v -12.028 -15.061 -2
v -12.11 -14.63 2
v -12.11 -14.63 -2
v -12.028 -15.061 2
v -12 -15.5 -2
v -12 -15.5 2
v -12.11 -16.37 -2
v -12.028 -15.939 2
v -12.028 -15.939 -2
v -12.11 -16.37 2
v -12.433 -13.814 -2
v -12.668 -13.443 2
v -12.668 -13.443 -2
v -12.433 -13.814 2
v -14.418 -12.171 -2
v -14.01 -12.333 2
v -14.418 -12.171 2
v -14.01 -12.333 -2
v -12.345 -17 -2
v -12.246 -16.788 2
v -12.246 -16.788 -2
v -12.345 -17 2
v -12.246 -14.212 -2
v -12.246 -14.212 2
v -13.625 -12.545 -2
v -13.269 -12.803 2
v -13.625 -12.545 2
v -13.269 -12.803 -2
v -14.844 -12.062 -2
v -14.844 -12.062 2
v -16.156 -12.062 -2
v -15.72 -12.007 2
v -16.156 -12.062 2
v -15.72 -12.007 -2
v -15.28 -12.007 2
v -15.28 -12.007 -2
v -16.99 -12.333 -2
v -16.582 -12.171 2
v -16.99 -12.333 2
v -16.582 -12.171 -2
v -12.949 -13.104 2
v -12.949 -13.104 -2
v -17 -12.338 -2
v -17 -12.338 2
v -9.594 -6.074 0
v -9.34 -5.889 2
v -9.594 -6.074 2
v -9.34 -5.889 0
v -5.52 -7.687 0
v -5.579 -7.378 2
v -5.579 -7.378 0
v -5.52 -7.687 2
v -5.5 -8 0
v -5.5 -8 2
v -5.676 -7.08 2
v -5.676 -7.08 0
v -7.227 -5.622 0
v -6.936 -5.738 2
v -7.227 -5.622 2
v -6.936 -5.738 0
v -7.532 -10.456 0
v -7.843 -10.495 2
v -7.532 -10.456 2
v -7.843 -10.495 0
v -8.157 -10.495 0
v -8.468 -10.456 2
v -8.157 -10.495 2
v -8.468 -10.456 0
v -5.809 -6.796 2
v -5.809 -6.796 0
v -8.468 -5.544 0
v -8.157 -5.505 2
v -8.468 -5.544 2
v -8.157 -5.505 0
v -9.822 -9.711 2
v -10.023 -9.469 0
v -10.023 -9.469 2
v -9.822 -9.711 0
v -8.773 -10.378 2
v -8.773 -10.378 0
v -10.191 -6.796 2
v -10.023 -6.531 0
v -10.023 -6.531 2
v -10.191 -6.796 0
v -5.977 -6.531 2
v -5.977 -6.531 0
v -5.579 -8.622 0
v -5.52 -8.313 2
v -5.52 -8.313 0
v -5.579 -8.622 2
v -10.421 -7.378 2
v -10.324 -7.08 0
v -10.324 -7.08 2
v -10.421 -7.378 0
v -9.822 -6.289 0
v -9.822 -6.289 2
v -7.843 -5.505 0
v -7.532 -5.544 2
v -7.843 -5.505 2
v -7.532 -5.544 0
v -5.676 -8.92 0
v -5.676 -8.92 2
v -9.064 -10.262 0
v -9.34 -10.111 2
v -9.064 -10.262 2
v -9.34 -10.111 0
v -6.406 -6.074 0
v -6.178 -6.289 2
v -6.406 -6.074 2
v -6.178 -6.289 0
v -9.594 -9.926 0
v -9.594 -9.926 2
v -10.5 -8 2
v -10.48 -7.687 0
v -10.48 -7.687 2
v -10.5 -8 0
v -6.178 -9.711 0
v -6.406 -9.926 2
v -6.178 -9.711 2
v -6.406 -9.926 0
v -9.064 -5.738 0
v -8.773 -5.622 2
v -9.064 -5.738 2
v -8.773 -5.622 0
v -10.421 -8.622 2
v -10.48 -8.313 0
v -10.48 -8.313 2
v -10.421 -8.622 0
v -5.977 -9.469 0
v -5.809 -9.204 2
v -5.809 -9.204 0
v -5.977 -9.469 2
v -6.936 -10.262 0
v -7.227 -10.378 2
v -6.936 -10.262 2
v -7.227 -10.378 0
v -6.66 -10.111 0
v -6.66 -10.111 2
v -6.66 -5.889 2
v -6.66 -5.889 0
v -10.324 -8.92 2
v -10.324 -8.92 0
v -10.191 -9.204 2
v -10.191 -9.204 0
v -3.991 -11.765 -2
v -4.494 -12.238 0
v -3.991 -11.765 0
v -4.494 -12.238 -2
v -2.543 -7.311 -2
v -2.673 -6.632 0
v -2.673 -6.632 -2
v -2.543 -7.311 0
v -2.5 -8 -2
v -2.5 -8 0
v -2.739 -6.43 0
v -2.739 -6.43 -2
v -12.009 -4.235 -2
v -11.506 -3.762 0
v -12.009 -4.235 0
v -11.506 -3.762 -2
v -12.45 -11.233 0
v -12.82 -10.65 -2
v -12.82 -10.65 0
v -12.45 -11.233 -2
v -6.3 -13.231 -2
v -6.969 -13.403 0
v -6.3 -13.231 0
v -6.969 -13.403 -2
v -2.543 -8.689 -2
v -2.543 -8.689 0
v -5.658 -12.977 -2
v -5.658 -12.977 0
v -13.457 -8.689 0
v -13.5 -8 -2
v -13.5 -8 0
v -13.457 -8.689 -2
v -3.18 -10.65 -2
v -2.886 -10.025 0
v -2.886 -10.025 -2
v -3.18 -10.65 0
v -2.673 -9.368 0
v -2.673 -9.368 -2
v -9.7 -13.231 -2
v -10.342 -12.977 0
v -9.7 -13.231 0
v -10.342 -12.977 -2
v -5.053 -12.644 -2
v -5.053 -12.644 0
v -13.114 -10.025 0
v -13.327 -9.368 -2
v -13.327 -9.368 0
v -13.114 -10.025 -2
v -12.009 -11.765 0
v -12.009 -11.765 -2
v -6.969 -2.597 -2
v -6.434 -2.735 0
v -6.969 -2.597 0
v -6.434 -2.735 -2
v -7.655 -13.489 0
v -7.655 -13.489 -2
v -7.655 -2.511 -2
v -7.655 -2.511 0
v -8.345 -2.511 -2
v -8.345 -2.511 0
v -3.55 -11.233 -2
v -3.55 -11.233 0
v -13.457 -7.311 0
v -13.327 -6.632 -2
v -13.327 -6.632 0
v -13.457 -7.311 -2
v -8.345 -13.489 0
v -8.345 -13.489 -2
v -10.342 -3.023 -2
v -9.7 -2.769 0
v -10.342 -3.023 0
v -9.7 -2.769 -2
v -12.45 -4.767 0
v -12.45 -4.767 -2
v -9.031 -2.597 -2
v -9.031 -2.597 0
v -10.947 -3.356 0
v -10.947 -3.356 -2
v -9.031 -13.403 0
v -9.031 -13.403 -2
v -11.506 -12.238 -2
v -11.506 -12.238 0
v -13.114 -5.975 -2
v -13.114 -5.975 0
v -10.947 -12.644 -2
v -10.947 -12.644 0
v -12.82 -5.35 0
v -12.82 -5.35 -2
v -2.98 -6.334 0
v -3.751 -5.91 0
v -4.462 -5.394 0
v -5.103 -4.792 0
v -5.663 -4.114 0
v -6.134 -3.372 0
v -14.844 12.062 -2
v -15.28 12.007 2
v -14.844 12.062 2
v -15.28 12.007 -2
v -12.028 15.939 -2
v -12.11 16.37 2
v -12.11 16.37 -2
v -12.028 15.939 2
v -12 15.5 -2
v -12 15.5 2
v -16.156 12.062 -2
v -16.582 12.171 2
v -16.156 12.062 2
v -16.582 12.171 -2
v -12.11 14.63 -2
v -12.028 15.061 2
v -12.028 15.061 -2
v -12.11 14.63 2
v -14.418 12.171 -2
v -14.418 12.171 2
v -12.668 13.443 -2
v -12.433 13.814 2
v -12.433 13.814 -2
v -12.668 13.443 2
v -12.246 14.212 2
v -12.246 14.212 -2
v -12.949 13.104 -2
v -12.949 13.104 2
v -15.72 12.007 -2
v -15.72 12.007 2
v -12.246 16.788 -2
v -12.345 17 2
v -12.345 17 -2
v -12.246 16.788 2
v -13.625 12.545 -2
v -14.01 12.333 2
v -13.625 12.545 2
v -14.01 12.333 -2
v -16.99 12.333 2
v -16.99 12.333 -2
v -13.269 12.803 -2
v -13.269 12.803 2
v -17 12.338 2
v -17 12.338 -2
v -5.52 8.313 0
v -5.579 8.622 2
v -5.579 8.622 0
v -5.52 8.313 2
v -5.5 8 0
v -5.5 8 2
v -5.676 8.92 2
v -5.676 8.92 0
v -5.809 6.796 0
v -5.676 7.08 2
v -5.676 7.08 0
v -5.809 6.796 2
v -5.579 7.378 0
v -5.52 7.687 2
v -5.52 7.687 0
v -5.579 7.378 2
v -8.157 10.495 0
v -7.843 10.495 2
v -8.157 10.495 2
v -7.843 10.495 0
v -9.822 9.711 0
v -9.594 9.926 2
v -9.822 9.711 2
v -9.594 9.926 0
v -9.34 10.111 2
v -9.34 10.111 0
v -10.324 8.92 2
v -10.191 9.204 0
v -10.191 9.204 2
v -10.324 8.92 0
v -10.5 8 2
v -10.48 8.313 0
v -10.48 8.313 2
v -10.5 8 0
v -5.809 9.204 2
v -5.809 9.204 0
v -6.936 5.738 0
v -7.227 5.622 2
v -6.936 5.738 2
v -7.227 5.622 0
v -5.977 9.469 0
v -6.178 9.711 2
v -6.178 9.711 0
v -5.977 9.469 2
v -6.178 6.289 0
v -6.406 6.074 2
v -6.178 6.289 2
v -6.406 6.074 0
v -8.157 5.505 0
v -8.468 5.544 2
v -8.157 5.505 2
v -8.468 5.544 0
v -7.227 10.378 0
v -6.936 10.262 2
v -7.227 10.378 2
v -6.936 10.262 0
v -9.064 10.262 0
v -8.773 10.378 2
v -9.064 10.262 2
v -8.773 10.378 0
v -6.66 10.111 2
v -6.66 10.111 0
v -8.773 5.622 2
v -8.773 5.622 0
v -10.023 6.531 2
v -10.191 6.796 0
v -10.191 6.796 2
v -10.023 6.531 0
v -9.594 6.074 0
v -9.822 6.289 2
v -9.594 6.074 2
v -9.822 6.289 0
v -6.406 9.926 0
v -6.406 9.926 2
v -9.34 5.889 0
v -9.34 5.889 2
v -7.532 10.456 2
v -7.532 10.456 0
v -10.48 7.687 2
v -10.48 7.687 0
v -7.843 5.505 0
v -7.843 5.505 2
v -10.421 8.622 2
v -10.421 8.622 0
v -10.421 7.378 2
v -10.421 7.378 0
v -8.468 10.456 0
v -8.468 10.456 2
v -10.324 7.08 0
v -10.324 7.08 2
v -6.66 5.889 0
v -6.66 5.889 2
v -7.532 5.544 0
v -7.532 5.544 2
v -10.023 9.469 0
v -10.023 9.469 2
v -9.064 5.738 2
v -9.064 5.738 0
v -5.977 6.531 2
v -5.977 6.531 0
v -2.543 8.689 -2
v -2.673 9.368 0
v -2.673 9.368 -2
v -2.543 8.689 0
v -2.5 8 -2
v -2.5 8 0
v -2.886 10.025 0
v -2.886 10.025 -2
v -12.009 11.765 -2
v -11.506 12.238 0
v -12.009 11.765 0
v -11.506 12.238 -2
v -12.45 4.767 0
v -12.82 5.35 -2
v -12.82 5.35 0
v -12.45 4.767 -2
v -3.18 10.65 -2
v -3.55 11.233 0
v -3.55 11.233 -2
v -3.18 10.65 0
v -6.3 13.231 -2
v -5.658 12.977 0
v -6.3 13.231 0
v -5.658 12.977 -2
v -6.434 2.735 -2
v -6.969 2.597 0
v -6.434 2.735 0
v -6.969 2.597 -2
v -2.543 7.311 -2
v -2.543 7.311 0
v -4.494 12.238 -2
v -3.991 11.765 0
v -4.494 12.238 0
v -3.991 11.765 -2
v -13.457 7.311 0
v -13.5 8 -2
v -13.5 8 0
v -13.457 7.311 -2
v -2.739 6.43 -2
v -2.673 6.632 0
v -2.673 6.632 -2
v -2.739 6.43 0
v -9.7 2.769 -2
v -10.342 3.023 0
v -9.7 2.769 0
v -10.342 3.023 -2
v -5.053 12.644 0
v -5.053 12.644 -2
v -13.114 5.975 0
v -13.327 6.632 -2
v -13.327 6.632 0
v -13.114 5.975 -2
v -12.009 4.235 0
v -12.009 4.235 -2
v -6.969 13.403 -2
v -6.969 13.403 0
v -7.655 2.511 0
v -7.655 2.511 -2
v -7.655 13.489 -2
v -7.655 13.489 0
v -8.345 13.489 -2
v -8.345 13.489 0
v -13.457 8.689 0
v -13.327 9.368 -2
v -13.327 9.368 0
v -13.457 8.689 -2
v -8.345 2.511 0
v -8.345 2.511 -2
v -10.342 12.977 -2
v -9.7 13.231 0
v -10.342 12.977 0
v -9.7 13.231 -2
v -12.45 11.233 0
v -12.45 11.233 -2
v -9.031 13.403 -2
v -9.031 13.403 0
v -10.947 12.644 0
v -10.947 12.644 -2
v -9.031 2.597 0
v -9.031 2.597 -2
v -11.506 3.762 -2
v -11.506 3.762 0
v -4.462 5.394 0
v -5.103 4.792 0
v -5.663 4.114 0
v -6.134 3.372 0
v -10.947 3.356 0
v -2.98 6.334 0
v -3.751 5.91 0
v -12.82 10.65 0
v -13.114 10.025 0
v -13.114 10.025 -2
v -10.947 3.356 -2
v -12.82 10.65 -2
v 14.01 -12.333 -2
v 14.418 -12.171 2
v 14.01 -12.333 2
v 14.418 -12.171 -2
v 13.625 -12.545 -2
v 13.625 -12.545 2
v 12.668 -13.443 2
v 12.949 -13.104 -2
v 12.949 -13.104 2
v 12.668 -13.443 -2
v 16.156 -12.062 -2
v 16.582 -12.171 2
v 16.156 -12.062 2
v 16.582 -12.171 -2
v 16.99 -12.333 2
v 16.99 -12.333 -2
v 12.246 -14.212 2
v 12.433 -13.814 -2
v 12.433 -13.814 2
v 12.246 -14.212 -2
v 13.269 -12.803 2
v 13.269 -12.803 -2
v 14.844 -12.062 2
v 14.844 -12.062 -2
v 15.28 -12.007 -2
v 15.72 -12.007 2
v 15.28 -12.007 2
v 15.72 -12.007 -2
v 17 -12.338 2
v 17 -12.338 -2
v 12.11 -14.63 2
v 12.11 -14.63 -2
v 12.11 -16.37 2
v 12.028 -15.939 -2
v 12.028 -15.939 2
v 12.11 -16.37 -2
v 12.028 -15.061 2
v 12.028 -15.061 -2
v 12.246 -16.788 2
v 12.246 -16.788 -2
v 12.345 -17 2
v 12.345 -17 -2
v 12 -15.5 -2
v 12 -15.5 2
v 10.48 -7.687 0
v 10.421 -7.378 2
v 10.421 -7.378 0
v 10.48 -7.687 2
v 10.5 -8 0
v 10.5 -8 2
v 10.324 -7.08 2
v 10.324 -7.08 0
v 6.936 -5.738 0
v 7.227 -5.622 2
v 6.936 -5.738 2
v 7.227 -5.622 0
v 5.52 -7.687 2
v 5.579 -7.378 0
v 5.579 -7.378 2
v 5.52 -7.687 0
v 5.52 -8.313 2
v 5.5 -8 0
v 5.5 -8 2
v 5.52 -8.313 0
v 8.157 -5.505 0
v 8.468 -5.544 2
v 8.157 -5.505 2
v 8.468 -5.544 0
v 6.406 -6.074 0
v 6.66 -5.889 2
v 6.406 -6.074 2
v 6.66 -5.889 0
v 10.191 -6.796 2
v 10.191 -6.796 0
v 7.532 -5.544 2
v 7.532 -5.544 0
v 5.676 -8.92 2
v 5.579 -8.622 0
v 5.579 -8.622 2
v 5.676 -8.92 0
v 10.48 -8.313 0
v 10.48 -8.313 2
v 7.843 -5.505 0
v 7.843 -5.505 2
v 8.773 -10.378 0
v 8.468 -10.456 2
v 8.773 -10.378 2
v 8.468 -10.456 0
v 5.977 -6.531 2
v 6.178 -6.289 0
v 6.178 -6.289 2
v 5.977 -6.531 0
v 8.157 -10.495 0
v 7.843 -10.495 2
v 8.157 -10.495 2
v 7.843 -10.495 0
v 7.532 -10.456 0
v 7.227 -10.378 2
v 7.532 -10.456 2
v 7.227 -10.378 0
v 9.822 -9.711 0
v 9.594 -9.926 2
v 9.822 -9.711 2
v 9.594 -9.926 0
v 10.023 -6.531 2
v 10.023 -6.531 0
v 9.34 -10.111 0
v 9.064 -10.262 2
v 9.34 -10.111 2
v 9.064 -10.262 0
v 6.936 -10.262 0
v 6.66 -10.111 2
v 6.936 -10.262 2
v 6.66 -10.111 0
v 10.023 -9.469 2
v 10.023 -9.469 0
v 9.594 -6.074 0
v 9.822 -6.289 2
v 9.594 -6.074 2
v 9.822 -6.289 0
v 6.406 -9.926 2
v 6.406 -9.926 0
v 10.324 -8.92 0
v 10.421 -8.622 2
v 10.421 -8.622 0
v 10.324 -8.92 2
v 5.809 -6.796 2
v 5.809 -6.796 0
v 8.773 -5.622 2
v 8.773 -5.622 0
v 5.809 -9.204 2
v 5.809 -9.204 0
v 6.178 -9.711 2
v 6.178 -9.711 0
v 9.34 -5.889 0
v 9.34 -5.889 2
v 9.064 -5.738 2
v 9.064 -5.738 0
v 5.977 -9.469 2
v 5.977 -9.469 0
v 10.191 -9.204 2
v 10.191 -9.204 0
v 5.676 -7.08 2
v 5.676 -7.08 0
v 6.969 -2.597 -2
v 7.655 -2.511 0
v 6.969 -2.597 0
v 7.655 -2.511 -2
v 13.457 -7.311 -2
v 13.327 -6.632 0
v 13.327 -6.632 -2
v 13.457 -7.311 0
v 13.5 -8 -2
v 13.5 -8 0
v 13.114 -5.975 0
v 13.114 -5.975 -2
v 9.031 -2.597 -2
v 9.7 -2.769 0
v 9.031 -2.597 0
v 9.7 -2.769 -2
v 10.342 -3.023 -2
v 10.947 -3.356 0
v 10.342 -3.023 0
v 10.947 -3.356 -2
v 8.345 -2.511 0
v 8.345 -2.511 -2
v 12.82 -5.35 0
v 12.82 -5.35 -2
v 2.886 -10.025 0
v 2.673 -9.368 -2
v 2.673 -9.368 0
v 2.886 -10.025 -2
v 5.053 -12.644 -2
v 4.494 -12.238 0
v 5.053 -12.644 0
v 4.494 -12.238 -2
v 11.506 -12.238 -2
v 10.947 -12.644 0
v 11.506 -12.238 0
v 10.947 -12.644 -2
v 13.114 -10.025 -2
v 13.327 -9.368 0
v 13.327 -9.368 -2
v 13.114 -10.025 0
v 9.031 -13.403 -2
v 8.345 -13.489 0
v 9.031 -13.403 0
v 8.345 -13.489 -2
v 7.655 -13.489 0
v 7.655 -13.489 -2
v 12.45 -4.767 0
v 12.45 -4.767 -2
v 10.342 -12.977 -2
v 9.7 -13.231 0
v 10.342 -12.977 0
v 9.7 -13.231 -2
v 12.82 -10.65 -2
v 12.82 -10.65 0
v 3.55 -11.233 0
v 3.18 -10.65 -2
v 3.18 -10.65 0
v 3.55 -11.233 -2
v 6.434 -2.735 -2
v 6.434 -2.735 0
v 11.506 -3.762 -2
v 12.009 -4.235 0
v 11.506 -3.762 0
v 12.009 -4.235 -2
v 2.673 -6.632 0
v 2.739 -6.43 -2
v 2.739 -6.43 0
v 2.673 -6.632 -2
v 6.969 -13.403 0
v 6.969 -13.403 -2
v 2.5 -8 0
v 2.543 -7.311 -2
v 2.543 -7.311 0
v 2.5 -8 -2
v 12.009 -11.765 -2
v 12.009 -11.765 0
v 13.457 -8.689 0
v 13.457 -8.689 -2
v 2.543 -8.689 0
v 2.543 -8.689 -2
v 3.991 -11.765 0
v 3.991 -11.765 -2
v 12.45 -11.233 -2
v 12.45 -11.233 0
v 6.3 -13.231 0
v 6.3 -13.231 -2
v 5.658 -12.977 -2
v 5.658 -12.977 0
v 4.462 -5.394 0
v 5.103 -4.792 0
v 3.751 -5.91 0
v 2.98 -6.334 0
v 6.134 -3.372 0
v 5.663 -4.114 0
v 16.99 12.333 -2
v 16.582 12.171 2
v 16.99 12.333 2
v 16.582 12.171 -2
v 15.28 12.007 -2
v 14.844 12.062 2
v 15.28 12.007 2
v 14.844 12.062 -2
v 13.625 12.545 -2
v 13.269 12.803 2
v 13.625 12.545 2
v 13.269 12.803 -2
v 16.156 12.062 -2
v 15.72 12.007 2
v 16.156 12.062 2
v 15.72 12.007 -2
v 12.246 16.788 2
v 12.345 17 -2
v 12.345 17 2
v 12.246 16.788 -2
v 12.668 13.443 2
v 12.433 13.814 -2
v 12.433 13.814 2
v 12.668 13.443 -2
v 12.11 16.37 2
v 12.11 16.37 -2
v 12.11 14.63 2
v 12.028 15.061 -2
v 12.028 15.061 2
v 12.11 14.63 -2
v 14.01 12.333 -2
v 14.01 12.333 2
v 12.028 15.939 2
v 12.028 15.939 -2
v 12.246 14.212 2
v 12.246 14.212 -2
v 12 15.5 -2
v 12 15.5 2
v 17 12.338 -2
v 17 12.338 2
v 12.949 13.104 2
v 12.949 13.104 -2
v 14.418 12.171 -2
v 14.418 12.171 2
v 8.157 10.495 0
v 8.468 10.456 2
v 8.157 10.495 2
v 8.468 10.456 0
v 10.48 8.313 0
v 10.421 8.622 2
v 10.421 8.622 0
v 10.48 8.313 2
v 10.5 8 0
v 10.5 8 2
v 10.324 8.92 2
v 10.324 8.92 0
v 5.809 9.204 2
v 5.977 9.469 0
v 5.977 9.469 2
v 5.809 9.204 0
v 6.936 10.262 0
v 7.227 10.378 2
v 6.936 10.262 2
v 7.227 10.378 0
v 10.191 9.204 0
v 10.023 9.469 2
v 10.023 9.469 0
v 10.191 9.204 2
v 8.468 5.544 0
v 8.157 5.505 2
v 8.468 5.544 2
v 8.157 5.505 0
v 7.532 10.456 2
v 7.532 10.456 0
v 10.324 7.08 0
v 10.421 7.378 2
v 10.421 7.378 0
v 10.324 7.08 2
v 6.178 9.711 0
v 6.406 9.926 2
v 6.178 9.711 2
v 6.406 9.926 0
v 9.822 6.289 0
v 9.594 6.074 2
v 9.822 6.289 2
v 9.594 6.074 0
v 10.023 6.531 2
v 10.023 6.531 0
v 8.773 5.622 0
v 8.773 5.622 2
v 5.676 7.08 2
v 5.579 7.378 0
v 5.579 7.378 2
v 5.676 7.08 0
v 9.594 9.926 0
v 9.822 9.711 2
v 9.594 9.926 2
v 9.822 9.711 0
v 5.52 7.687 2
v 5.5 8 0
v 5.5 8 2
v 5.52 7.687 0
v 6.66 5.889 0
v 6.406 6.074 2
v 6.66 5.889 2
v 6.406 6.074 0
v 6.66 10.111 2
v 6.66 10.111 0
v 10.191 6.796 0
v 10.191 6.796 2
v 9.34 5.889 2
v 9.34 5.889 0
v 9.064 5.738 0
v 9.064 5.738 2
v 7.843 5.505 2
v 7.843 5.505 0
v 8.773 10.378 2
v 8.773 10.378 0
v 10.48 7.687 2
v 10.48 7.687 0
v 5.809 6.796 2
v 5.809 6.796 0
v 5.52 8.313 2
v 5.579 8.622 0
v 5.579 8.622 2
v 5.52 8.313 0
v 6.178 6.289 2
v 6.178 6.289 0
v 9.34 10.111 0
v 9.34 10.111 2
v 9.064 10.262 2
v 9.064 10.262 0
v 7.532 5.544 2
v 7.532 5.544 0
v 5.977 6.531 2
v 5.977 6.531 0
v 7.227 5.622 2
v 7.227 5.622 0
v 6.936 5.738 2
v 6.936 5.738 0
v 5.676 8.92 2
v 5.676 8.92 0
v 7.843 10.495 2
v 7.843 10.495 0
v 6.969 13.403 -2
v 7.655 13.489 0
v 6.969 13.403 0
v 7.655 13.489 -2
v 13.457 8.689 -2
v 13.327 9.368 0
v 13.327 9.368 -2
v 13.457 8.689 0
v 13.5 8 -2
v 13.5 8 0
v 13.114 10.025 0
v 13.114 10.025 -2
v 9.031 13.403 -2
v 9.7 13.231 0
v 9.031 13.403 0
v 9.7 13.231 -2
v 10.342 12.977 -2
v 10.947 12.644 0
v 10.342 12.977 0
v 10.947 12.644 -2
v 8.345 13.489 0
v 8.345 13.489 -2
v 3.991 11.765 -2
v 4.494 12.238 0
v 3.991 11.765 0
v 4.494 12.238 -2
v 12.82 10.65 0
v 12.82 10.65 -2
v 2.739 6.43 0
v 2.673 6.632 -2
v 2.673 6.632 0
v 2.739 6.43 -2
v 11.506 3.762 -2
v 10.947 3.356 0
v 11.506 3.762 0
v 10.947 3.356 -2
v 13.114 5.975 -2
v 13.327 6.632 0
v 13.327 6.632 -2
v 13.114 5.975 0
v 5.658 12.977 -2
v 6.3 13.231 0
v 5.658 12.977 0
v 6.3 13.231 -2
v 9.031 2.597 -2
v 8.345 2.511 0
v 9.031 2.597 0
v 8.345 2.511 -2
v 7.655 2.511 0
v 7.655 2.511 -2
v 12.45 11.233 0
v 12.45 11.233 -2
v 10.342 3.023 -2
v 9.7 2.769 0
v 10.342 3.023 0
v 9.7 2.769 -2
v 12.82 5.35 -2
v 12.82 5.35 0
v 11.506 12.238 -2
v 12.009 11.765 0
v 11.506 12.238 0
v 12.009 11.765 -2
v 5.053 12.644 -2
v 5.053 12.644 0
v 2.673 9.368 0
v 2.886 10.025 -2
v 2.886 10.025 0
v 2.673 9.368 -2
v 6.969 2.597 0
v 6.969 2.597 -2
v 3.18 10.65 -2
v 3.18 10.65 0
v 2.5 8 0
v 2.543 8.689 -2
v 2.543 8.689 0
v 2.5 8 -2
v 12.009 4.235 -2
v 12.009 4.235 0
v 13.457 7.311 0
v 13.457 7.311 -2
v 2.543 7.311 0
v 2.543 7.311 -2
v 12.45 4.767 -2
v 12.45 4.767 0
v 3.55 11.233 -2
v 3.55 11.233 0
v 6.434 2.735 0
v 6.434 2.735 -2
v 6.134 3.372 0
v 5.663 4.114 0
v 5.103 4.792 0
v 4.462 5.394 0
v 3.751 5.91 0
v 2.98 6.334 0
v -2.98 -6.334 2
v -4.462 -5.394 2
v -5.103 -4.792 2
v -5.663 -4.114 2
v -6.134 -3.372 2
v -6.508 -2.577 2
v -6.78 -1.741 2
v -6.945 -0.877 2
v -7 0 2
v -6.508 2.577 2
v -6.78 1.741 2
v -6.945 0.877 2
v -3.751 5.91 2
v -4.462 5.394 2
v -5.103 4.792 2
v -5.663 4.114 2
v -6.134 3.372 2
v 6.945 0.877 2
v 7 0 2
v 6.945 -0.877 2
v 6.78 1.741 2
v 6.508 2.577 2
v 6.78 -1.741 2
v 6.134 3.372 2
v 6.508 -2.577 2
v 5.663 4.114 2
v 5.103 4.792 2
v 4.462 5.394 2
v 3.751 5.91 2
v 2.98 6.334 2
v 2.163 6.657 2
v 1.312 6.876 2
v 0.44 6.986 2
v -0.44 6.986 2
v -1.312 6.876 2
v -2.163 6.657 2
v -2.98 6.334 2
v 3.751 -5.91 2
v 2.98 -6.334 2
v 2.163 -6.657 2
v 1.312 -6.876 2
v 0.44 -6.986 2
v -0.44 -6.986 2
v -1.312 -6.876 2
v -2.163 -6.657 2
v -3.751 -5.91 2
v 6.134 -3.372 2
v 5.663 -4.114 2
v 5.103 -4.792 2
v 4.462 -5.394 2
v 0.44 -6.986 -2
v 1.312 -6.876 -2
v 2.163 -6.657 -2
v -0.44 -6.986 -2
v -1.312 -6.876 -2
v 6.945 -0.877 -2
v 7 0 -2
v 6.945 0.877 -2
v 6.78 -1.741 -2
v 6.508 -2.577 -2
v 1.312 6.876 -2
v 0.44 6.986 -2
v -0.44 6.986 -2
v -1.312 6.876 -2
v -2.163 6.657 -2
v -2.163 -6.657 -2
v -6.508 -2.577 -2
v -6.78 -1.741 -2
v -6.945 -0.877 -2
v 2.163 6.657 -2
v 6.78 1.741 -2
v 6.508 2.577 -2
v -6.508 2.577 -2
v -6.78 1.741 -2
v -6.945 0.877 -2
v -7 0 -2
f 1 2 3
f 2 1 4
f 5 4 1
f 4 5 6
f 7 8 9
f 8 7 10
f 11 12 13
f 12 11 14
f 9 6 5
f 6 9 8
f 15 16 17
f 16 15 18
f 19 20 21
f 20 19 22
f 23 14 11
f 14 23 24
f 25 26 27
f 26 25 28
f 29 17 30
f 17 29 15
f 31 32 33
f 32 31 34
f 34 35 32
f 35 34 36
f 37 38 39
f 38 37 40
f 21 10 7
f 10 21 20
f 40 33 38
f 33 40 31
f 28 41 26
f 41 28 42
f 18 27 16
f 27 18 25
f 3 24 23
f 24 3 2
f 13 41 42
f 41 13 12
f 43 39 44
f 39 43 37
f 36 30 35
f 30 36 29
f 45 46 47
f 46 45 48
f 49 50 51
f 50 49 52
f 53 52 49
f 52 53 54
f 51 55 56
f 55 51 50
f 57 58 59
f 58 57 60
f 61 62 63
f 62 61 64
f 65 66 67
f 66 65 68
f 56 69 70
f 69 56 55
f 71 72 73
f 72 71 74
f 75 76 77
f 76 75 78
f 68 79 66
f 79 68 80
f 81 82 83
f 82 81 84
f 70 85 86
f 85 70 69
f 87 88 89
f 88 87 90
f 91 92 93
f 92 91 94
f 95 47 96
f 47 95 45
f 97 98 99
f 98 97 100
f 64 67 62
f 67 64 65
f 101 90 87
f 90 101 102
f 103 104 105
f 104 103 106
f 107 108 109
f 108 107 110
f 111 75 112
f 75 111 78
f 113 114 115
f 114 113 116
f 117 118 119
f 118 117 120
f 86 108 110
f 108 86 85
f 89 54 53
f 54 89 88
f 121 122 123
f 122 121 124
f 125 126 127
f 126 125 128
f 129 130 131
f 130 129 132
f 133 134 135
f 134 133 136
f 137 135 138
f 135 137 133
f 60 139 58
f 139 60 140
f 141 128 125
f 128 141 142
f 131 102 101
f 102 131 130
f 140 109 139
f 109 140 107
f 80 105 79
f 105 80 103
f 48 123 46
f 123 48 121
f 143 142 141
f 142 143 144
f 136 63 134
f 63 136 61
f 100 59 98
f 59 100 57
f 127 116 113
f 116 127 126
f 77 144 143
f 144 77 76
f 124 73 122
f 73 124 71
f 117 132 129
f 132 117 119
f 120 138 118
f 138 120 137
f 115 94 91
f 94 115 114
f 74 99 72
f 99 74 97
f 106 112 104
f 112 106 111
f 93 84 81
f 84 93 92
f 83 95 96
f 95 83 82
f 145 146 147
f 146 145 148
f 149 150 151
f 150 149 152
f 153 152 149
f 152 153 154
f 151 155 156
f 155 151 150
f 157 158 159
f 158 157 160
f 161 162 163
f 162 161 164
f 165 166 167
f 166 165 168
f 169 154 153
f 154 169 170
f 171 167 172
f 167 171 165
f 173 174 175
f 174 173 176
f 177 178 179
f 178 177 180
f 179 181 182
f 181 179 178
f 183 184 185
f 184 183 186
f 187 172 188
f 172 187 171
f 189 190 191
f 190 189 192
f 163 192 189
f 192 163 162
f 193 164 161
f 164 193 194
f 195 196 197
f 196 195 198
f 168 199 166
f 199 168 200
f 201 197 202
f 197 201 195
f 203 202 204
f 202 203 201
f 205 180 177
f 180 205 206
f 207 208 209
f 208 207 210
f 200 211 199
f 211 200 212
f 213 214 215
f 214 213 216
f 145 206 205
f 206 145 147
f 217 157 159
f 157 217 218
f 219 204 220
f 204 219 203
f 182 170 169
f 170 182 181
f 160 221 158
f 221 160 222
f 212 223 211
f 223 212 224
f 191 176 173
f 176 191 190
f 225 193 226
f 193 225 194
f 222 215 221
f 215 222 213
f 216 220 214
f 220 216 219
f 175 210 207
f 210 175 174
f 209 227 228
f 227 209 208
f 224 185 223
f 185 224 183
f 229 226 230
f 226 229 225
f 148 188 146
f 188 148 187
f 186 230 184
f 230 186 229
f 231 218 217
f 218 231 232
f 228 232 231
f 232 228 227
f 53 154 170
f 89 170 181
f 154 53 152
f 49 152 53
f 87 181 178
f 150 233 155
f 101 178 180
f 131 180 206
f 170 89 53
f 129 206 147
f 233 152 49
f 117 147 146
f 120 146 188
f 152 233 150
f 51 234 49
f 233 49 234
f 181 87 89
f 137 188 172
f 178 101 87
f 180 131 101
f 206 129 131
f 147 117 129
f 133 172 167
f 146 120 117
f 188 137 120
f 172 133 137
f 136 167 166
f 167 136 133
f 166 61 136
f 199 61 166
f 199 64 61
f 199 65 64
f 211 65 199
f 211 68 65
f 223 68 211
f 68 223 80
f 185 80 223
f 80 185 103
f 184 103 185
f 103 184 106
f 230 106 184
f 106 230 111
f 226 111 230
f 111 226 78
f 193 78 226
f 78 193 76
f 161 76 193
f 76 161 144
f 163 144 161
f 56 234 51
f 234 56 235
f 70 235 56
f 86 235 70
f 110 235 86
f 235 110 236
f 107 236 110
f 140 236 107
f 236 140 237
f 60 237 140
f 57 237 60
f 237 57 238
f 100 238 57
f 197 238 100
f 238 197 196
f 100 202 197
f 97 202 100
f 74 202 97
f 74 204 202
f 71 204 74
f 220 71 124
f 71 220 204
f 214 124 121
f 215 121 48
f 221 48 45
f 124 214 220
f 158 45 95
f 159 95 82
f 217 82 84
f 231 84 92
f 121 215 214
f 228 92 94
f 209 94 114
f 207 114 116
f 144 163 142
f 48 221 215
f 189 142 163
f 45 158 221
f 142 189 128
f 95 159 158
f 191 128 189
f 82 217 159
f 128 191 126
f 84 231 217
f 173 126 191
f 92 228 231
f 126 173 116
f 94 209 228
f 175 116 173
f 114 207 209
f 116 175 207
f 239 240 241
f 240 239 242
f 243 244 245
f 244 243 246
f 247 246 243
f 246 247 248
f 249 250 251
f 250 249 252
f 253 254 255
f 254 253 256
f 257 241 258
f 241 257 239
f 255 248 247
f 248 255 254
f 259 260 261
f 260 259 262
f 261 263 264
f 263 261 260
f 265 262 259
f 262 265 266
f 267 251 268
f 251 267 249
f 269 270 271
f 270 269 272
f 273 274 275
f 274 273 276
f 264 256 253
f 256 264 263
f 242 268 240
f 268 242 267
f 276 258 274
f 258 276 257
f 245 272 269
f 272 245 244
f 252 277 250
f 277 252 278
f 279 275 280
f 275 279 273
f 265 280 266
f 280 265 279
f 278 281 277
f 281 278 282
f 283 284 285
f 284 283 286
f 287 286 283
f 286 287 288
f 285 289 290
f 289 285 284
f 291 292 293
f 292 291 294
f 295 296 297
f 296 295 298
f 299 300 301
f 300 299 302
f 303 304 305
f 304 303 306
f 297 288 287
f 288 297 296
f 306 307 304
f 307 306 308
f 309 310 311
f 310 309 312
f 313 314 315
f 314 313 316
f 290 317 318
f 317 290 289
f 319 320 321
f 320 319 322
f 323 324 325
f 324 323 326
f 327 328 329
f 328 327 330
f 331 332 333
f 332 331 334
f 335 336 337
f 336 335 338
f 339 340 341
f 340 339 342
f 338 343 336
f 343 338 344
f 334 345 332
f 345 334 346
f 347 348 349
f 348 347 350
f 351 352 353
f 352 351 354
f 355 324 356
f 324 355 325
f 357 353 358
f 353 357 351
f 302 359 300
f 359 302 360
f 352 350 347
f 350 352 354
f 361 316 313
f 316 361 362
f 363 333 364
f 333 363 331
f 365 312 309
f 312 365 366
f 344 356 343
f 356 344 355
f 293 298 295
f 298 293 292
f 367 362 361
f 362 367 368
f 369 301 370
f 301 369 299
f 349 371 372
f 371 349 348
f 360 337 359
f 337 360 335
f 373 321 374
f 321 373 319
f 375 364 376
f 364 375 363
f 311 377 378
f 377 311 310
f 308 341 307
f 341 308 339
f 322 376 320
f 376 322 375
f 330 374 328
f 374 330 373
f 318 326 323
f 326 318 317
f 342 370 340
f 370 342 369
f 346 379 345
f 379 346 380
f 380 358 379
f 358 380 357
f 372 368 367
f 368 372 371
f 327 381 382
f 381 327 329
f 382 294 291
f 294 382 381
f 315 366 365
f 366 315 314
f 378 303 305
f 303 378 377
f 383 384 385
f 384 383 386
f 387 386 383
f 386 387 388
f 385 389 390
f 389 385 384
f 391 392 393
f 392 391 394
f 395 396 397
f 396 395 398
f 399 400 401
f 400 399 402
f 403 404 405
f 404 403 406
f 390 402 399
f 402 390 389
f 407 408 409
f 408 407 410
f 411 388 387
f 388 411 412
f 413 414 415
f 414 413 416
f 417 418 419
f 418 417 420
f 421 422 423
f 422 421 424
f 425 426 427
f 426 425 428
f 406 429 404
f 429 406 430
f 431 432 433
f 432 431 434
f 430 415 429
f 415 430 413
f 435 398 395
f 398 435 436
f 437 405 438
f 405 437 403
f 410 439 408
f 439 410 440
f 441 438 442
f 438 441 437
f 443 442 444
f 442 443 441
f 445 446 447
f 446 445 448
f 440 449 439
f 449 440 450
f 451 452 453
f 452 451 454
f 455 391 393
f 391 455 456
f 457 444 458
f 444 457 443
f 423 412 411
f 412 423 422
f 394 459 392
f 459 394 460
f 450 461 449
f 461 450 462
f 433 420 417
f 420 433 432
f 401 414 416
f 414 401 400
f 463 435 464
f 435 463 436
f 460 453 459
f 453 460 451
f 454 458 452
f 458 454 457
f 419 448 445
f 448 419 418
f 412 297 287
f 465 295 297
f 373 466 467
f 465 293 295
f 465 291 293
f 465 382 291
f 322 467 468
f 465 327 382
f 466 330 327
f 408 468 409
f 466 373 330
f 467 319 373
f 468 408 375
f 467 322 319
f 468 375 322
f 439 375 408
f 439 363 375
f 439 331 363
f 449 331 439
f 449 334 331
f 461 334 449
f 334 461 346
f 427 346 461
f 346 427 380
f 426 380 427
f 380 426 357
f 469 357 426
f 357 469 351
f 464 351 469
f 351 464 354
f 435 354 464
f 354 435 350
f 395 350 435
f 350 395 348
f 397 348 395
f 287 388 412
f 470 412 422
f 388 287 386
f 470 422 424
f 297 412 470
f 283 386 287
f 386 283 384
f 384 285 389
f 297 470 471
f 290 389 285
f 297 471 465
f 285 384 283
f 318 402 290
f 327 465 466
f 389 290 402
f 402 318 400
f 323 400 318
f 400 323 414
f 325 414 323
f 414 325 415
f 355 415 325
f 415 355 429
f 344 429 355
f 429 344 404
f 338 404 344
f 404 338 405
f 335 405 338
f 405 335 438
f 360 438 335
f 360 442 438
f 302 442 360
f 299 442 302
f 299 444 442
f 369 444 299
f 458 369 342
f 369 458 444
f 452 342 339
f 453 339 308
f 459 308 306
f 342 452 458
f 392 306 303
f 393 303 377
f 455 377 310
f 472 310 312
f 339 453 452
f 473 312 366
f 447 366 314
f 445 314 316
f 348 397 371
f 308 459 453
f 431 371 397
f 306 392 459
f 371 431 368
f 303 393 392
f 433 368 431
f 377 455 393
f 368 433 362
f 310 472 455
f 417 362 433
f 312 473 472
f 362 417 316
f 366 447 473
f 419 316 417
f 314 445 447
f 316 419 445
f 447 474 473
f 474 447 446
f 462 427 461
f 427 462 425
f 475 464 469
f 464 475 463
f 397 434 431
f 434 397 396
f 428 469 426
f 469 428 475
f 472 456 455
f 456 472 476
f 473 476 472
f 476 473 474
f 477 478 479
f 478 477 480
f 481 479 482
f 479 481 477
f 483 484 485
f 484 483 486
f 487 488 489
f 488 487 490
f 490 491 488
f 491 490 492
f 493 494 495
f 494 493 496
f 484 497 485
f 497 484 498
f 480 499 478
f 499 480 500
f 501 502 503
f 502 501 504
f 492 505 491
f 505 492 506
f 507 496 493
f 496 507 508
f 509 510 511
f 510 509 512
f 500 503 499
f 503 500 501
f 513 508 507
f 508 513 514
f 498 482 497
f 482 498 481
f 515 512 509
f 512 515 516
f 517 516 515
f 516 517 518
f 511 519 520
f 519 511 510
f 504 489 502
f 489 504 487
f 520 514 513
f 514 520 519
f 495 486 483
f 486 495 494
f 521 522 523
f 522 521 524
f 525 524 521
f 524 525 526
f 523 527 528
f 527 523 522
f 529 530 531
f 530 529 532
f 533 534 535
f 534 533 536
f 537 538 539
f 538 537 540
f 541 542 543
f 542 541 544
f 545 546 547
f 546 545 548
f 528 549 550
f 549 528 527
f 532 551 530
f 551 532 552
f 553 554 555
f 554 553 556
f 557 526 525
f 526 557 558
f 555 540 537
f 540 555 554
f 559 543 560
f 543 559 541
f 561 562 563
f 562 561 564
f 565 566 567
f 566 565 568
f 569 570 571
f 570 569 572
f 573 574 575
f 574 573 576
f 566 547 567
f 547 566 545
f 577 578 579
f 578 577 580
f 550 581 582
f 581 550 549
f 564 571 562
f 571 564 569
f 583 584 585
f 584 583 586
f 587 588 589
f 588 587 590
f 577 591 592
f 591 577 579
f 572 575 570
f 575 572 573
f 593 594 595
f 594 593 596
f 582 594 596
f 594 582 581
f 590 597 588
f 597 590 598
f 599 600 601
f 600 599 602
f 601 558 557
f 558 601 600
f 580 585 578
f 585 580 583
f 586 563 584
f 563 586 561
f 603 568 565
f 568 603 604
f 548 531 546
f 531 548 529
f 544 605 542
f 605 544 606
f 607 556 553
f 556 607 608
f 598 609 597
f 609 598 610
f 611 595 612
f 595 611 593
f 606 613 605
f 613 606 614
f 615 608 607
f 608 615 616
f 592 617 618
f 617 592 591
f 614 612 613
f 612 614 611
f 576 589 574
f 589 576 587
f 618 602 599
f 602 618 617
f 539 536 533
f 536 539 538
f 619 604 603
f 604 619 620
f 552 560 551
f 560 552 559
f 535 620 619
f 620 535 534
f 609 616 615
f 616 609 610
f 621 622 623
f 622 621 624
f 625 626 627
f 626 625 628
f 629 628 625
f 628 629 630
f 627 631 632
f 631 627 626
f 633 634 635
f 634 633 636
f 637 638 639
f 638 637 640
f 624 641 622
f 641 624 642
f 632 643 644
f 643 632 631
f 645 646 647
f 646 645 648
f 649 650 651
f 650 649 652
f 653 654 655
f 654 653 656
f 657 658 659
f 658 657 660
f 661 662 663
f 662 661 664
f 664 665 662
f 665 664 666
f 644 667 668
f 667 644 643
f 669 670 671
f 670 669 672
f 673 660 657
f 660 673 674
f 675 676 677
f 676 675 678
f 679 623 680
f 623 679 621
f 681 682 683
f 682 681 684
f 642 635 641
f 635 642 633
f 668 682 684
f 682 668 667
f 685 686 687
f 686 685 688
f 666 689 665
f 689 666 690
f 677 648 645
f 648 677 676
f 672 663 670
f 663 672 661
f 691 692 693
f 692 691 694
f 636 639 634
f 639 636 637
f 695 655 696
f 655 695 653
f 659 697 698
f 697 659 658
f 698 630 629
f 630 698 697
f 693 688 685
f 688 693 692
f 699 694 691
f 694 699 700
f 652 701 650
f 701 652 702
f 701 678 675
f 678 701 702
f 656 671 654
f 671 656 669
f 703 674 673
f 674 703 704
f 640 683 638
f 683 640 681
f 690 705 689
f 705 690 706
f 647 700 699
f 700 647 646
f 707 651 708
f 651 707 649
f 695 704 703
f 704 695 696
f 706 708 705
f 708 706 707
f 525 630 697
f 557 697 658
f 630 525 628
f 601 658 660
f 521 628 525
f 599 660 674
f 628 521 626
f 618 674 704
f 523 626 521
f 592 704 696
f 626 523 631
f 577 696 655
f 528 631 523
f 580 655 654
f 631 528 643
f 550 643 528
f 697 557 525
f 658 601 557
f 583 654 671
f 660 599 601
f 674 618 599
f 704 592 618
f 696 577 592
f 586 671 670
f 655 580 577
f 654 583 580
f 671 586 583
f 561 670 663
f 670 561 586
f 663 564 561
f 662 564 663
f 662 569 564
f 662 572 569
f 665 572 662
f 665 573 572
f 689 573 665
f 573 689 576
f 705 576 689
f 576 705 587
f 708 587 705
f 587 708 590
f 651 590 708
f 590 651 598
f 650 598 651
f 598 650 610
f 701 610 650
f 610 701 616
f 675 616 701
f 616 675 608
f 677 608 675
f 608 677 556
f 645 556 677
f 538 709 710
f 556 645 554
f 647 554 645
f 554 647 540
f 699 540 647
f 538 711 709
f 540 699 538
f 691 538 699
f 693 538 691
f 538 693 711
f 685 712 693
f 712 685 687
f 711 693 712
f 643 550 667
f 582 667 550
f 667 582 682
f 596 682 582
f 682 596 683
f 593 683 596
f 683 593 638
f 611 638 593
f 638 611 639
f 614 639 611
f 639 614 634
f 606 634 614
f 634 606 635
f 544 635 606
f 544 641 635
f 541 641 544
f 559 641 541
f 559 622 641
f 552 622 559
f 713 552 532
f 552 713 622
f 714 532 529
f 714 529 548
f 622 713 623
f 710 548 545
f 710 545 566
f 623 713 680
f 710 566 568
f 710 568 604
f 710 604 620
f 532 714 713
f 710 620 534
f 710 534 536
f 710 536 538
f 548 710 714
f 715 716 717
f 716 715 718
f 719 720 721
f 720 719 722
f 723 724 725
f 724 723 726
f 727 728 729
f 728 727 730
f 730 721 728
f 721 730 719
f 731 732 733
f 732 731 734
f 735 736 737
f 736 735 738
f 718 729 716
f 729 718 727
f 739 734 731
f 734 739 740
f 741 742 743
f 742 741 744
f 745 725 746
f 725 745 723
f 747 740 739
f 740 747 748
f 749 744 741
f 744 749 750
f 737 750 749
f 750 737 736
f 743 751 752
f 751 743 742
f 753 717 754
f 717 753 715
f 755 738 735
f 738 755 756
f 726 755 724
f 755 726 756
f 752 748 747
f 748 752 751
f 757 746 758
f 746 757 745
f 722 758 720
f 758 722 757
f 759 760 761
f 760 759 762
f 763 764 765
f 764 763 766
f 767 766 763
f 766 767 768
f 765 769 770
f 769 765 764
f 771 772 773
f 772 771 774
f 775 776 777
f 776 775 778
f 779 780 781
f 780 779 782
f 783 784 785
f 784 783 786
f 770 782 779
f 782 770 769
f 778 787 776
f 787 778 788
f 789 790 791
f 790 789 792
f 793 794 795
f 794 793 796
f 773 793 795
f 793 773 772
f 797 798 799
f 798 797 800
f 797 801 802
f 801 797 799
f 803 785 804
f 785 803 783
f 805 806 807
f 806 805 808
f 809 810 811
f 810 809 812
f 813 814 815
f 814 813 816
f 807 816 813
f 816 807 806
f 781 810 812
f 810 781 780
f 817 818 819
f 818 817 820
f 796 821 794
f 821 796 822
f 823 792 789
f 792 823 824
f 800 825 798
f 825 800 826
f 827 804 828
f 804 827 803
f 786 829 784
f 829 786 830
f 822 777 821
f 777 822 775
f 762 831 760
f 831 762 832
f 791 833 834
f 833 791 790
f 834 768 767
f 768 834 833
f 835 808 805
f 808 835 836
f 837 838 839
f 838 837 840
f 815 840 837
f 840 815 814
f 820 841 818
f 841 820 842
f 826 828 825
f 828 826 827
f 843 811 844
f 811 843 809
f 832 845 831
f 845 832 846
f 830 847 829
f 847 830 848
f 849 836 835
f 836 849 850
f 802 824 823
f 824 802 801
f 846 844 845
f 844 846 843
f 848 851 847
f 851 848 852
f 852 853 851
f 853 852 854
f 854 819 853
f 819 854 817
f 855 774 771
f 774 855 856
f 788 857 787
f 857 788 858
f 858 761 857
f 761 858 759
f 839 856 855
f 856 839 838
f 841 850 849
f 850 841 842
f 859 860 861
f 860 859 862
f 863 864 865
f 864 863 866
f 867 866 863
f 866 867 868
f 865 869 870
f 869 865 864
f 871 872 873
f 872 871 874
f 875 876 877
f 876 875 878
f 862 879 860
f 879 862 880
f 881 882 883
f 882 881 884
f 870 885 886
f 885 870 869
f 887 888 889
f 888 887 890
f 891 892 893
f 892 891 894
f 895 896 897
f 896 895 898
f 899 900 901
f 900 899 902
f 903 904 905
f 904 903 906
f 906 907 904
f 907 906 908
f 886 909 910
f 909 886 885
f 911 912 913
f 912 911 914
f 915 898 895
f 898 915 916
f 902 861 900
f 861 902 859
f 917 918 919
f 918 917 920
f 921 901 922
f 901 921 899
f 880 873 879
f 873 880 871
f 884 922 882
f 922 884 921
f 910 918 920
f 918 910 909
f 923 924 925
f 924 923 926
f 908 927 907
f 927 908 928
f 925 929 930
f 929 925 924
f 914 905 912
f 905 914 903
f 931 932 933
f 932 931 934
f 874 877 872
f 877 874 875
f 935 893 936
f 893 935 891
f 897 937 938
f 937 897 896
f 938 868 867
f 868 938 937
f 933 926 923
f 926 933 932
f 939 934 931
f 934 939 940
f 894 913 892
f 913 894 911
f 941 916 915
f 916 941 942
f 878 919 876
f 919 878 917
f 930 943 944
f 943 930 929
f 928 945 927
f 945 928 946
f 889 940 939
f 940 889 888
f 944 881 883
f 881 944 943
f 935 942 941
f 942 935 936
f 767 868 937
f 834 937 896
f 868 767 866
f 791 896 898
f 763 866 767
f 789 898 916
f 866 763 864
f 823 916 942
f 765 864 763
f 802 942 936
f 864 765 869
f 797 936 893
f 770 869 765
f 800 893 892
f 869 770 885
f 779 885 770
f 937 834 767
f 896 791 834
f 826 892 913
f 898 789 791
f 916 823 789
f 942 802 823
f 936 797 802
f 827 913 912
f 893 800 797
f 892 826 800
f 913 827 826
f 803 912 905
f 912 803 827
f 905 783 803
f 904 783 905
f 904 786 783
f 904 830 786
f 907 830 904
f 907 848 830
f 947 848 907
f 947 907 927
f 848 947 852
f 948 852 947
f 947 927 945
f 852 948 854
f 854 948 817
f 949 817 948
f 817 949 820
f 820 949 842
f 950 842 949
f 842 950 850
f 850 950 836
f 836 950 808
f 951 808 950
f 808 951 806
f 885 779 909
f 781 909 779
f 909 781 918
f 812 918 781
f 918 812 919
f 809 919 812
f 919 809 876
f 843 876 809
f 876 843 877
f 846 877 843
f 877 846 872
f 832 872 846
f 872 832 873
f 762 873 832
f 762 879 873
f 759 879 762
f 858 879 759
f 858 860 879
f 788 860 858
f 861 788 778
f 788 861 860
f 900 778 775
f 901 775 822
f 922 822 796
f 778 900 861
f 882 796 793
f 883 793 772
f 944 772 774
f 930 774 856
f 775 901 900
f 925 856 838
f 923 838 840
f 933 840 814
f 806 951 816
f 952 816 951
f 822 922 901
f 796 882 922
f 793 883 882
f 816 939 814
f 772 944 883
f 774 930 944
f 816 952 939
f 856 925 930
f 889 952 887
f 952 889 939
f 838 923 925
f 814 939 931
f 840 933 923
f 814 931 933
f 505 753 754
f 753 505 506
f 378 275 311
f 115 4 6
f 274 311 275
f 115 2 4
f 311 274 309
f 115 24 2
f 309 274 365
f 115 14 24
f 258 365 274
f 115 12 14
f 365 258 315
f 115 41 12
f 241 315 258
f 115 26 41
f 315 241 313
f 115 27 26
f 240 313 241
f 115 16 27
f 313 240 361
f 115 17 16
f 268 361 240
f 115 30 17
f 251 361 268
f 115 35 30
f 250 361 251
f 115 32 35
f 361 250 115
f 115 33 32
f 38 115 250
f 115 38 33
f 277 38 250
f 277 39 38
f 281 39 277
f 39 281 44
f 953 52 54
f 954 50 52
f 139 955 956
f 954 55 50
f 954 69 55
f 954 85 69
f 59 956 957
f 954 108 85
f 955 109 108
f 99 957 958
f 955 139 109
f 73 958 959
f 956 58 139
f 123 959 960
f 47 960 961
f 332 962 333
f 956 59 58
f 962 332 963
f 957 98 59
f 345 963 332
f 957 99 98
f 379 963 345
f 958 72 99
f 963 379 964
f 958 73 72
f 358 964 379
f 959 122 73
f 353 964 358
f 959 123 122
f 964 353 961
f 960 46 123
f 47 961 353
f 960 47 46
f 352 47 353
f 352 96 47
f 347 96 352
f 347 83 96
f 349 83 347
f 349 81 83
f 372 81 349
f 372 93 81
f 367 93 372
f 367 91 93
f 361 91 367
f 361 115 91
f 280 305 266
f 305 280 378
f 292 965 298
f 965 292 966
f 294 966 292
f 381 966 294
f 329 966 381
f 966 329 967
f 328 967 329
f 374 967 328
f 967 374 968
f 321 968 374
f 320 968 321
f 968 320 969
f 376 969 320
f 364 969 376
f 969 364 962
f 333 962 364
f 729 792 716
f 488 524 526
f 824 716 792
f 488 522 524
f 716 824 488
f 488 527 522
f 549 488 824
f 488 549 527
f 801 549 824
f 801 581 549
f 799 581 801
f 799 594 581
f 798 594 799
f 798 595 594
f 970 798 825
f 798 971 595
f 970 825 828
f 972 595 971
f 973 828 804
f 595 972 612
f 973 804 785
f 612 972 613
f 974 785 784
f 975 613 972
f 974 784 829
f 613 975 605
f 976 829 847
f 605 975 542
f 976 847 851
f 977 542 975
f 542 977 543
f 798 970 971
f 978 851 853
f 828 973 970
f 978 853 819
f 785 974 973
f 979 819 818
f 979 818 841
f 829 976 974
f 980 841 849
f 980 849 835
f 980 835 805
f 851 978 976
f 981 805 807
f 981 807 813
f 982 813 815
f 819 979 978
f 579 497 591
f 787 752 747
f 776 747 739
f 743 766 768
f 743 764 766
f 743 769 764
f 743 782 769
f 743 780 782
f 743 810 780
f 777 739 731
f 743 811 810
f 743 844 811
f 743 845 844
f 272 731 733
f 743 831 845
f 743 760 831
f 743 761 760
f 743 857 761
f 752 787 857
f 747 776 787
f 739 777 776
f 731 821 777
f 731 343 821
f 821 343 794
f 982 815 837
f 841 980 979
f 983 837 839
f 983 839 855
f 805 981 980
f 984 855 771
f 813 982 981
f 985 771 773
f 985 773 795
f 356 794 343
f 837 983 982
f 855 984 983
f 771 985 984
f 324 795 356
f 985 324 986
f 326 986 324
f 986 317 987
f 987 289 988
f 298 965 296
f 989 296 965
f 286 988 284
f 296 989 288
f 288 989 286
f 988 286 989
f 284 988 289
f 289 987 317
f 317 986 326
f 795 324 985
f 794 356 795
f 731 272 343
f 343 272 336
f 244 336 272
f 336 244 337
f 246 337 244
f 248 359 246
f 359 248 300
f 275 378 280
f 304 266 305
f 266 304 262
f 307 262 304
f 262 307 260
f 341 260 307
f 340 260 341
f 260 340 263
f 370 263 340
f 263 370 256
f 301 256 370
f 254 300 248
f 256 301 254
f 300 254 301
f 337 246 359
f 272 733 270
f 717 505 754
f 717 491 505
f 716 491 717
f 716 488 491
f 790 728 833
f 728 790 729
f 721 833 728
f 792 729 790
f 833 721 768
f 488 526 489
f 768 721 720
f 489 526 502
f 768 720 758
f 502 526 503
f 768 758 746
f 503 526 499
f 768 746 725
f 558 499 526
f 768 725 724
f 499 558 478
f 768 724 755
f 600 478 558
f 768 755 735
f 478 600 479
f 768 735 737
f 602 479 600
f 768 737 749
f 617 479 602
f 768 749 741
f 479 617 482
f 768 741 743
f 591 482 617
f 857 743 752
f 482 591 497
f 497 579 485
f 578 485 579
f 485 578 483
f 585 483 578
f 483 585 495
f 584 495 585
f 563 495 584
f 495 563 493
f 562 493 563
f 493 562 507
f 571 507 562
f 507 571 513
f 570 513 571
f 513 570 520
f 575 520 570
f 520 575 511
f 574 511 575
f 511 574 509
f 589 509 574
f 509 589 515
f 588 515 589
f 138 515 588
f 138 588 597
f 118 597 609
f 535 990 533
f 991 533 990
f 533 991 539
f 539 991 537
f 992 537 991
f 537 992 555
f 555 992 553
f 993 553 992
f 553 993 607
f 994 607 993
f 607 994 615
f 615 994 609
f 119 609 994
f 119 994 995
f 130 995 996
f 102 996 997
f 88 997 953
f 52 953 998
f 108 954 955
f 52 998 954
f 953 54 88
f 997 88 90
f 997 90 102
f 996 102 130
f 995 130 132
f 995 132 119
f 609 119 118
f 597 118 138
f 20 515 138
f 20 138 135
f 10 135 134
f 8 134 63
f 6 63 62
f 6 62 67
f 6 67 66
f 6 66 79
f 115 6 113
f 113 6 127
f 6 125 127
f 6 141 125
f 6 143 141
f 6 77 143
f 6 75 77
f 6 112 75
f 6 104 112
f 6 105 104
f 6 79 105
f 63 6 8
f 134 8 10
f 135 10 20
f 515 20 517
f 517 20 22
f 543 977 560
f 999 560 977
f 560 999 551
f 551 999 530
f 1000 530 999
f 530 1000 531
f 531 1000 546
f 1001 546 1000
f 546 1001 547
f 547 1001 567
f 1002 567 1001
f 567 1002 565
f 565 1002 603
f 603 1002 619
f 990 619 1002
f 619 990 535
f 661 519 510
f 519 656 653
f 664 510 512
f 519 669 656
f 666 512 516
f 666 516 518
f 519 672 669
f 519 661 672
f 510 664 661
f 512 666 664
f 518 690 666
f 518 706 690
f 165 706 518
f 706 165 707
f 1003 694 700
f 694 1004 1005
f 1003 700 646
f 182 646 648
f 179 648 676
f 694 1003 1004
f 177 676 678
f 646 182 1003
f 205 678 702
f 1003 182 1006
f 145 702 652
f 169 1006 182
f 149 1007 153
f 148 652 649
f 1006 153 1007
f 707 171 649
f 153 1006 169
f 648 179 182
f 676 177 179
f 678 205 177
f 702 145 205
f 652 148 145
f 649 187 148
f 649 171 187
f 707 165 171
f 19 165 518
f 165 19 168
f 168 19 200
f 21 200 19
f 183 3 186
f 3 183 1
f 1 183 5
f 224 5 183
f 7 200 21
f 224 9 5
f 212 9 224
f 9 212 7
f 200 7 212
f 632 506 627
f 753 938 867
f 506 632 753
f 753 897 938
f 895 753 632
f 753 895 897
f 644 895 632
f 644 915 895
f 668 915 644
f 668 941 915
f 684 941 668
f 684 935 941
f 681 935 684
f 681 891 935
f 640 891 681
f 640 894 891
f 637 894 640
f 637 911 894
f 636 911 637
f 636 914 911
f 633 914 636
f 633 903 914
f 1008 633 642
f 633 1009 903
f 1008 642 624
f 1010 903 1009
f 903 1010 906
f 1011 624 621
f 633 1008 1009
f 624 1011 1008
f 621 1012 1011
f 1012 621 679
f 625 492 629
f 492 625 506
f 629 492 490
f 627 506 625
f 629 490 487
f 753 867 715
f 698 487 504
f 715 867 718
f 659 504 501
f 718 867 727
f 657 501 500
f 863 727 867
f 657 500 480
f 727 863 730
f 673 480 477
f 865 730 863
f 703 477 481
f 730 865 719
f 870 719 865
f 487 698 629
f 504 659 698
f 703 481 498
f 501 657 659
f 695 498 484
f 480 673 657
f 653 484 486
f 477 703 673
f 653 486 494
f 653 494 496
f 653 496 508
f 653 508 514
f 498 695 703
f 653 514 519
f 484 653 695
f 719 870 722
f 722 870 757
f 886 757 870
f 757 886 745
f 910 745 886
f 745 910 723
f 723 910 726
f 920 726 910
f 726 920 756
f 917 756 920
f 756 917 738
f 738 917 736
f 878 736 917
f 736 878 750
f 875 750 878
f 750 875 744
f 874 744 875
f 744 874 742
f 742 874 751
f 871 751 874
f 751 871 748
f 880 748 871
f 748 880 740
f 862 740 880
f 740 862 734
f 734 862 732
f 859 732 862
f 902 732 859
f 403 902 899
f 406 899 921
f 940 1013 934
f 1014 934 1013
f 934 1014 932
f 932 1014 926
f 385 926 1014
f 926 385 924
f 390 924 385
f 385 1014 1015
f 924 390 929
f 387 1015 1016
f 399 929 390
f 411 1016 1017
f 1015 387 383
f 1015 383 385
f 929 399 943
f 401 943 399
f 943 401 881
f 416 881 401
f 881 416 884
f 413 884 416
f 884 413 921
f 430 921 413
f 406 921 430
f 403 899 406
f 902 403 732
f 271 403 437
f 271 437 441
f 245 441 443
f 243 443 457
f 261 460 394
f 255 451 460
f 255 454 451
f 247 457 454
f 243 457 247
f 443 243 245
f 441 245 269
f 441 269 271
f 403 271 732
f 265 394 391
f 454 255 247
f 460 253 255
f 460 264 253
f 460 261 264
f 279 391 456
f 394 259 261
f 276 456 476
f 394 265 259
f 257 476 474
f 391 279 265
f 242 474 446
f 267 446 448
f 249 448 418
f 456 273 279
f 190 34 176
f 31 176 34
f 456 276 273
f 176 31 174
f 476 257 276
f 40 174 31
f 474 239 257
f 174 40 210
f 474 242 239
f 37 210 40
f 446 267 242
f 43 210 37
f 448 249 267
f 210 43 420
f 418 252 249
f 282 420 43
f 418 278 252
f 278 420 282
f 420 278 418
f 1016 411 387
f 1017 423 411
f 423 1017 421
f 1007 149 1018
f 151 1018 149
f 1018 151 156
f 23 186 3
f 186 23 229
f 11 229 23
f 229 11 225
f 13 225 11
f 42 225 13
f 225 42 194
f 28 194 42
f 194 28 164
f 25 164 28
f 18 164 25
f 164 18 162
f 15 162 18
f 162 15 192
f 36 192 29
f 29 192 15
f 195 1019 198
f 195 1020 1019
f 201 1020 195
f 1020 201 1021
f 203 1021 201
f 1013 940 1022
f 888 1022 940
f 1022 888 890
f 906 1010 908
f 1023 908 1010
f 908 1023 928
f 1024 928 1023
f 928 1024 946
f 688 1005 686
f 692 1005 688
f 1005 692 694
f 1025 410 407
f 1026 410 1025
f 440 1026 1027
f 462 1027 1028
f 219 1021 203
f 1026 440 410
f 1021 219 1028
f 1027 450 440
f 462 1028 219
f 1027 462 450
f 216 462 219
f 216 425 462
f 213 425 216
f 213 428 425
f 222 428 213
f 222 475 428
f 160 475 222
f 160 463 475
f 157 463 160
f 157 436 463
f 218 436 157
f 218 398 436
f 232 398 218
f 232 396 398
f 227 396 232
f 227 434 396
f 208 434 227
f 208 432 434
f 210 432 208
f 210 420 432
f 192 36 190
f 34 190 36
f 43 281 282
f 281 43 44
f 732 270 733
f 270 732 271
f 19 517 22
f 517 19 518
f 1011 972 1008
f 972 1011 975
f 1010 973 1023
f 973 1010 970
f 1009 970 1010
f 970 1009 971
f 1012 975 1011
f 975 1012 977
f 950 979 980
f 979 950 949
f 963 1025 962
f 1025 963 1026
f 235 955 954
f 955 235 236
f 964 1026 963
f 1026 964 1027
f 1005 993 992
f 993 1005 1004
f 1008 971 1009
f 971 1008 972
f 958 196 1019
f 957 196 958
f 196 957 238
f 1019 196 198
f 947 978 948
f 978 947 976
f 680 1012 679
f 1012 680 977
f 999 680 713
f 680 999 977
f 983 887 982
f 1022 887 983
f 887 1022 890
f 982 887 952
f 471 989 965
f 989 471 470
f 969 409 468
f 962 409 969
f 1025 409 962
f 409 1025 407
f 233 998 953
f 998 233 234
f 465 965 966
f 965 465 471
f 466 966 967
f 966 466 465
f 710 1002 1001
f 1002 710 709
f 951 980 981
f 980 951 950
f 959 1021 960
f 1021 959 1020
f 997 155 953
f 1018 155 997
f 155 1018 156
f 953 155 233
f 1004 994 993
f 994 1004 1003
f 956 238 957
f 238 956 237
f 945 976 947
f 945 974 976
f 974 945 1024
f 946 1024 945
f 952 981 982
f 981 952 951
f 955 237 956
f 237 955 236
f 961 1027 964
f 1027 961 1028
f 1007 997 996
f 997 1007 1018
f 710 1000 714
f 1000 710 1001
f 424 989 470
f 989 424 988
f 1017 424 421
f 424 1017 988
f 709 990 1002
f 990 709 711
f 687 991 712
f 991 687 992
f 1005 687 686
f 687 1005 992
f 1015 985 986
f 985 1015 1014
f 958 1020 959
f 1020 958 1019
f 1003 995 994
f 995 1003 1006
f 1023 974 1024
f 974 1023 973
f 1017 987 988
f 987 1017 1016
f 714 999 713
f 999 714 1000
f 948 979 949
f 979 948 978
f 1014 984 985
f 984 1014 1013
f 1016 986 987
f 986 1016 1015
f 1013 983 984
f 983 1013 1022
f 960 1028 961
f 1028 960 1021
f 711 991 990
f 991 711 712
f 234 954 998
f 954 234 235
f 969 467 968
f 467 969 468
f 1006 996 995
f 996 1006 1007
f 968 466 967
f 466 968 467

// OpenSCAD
$fn=50; 

// warning: you have to snip a bit off the syringe heads here
// and cut the threads for the travelling nut

difference() {
    cube( [34,34,4], center=true ); 
    cylinder( r=7, h=10, center=true ); // center 
    for (i=[-1,1]) { // syringe bays 
        for (j=[-1,1]) {
            translate( [15.5*i, 15.5*j, 0] ) cylinder( r=3.5, h=20, center=true ); // sliding notch 
            translate( [8*i, 8*j, 0] ) cylinder( r=2.5, h=20, center=true ); // shaft hole
            translate( [8*i, 8*j, -3] ) cylinder( r=5.5, h=6, center=true ); // head bays 
        }
    }
    
}
